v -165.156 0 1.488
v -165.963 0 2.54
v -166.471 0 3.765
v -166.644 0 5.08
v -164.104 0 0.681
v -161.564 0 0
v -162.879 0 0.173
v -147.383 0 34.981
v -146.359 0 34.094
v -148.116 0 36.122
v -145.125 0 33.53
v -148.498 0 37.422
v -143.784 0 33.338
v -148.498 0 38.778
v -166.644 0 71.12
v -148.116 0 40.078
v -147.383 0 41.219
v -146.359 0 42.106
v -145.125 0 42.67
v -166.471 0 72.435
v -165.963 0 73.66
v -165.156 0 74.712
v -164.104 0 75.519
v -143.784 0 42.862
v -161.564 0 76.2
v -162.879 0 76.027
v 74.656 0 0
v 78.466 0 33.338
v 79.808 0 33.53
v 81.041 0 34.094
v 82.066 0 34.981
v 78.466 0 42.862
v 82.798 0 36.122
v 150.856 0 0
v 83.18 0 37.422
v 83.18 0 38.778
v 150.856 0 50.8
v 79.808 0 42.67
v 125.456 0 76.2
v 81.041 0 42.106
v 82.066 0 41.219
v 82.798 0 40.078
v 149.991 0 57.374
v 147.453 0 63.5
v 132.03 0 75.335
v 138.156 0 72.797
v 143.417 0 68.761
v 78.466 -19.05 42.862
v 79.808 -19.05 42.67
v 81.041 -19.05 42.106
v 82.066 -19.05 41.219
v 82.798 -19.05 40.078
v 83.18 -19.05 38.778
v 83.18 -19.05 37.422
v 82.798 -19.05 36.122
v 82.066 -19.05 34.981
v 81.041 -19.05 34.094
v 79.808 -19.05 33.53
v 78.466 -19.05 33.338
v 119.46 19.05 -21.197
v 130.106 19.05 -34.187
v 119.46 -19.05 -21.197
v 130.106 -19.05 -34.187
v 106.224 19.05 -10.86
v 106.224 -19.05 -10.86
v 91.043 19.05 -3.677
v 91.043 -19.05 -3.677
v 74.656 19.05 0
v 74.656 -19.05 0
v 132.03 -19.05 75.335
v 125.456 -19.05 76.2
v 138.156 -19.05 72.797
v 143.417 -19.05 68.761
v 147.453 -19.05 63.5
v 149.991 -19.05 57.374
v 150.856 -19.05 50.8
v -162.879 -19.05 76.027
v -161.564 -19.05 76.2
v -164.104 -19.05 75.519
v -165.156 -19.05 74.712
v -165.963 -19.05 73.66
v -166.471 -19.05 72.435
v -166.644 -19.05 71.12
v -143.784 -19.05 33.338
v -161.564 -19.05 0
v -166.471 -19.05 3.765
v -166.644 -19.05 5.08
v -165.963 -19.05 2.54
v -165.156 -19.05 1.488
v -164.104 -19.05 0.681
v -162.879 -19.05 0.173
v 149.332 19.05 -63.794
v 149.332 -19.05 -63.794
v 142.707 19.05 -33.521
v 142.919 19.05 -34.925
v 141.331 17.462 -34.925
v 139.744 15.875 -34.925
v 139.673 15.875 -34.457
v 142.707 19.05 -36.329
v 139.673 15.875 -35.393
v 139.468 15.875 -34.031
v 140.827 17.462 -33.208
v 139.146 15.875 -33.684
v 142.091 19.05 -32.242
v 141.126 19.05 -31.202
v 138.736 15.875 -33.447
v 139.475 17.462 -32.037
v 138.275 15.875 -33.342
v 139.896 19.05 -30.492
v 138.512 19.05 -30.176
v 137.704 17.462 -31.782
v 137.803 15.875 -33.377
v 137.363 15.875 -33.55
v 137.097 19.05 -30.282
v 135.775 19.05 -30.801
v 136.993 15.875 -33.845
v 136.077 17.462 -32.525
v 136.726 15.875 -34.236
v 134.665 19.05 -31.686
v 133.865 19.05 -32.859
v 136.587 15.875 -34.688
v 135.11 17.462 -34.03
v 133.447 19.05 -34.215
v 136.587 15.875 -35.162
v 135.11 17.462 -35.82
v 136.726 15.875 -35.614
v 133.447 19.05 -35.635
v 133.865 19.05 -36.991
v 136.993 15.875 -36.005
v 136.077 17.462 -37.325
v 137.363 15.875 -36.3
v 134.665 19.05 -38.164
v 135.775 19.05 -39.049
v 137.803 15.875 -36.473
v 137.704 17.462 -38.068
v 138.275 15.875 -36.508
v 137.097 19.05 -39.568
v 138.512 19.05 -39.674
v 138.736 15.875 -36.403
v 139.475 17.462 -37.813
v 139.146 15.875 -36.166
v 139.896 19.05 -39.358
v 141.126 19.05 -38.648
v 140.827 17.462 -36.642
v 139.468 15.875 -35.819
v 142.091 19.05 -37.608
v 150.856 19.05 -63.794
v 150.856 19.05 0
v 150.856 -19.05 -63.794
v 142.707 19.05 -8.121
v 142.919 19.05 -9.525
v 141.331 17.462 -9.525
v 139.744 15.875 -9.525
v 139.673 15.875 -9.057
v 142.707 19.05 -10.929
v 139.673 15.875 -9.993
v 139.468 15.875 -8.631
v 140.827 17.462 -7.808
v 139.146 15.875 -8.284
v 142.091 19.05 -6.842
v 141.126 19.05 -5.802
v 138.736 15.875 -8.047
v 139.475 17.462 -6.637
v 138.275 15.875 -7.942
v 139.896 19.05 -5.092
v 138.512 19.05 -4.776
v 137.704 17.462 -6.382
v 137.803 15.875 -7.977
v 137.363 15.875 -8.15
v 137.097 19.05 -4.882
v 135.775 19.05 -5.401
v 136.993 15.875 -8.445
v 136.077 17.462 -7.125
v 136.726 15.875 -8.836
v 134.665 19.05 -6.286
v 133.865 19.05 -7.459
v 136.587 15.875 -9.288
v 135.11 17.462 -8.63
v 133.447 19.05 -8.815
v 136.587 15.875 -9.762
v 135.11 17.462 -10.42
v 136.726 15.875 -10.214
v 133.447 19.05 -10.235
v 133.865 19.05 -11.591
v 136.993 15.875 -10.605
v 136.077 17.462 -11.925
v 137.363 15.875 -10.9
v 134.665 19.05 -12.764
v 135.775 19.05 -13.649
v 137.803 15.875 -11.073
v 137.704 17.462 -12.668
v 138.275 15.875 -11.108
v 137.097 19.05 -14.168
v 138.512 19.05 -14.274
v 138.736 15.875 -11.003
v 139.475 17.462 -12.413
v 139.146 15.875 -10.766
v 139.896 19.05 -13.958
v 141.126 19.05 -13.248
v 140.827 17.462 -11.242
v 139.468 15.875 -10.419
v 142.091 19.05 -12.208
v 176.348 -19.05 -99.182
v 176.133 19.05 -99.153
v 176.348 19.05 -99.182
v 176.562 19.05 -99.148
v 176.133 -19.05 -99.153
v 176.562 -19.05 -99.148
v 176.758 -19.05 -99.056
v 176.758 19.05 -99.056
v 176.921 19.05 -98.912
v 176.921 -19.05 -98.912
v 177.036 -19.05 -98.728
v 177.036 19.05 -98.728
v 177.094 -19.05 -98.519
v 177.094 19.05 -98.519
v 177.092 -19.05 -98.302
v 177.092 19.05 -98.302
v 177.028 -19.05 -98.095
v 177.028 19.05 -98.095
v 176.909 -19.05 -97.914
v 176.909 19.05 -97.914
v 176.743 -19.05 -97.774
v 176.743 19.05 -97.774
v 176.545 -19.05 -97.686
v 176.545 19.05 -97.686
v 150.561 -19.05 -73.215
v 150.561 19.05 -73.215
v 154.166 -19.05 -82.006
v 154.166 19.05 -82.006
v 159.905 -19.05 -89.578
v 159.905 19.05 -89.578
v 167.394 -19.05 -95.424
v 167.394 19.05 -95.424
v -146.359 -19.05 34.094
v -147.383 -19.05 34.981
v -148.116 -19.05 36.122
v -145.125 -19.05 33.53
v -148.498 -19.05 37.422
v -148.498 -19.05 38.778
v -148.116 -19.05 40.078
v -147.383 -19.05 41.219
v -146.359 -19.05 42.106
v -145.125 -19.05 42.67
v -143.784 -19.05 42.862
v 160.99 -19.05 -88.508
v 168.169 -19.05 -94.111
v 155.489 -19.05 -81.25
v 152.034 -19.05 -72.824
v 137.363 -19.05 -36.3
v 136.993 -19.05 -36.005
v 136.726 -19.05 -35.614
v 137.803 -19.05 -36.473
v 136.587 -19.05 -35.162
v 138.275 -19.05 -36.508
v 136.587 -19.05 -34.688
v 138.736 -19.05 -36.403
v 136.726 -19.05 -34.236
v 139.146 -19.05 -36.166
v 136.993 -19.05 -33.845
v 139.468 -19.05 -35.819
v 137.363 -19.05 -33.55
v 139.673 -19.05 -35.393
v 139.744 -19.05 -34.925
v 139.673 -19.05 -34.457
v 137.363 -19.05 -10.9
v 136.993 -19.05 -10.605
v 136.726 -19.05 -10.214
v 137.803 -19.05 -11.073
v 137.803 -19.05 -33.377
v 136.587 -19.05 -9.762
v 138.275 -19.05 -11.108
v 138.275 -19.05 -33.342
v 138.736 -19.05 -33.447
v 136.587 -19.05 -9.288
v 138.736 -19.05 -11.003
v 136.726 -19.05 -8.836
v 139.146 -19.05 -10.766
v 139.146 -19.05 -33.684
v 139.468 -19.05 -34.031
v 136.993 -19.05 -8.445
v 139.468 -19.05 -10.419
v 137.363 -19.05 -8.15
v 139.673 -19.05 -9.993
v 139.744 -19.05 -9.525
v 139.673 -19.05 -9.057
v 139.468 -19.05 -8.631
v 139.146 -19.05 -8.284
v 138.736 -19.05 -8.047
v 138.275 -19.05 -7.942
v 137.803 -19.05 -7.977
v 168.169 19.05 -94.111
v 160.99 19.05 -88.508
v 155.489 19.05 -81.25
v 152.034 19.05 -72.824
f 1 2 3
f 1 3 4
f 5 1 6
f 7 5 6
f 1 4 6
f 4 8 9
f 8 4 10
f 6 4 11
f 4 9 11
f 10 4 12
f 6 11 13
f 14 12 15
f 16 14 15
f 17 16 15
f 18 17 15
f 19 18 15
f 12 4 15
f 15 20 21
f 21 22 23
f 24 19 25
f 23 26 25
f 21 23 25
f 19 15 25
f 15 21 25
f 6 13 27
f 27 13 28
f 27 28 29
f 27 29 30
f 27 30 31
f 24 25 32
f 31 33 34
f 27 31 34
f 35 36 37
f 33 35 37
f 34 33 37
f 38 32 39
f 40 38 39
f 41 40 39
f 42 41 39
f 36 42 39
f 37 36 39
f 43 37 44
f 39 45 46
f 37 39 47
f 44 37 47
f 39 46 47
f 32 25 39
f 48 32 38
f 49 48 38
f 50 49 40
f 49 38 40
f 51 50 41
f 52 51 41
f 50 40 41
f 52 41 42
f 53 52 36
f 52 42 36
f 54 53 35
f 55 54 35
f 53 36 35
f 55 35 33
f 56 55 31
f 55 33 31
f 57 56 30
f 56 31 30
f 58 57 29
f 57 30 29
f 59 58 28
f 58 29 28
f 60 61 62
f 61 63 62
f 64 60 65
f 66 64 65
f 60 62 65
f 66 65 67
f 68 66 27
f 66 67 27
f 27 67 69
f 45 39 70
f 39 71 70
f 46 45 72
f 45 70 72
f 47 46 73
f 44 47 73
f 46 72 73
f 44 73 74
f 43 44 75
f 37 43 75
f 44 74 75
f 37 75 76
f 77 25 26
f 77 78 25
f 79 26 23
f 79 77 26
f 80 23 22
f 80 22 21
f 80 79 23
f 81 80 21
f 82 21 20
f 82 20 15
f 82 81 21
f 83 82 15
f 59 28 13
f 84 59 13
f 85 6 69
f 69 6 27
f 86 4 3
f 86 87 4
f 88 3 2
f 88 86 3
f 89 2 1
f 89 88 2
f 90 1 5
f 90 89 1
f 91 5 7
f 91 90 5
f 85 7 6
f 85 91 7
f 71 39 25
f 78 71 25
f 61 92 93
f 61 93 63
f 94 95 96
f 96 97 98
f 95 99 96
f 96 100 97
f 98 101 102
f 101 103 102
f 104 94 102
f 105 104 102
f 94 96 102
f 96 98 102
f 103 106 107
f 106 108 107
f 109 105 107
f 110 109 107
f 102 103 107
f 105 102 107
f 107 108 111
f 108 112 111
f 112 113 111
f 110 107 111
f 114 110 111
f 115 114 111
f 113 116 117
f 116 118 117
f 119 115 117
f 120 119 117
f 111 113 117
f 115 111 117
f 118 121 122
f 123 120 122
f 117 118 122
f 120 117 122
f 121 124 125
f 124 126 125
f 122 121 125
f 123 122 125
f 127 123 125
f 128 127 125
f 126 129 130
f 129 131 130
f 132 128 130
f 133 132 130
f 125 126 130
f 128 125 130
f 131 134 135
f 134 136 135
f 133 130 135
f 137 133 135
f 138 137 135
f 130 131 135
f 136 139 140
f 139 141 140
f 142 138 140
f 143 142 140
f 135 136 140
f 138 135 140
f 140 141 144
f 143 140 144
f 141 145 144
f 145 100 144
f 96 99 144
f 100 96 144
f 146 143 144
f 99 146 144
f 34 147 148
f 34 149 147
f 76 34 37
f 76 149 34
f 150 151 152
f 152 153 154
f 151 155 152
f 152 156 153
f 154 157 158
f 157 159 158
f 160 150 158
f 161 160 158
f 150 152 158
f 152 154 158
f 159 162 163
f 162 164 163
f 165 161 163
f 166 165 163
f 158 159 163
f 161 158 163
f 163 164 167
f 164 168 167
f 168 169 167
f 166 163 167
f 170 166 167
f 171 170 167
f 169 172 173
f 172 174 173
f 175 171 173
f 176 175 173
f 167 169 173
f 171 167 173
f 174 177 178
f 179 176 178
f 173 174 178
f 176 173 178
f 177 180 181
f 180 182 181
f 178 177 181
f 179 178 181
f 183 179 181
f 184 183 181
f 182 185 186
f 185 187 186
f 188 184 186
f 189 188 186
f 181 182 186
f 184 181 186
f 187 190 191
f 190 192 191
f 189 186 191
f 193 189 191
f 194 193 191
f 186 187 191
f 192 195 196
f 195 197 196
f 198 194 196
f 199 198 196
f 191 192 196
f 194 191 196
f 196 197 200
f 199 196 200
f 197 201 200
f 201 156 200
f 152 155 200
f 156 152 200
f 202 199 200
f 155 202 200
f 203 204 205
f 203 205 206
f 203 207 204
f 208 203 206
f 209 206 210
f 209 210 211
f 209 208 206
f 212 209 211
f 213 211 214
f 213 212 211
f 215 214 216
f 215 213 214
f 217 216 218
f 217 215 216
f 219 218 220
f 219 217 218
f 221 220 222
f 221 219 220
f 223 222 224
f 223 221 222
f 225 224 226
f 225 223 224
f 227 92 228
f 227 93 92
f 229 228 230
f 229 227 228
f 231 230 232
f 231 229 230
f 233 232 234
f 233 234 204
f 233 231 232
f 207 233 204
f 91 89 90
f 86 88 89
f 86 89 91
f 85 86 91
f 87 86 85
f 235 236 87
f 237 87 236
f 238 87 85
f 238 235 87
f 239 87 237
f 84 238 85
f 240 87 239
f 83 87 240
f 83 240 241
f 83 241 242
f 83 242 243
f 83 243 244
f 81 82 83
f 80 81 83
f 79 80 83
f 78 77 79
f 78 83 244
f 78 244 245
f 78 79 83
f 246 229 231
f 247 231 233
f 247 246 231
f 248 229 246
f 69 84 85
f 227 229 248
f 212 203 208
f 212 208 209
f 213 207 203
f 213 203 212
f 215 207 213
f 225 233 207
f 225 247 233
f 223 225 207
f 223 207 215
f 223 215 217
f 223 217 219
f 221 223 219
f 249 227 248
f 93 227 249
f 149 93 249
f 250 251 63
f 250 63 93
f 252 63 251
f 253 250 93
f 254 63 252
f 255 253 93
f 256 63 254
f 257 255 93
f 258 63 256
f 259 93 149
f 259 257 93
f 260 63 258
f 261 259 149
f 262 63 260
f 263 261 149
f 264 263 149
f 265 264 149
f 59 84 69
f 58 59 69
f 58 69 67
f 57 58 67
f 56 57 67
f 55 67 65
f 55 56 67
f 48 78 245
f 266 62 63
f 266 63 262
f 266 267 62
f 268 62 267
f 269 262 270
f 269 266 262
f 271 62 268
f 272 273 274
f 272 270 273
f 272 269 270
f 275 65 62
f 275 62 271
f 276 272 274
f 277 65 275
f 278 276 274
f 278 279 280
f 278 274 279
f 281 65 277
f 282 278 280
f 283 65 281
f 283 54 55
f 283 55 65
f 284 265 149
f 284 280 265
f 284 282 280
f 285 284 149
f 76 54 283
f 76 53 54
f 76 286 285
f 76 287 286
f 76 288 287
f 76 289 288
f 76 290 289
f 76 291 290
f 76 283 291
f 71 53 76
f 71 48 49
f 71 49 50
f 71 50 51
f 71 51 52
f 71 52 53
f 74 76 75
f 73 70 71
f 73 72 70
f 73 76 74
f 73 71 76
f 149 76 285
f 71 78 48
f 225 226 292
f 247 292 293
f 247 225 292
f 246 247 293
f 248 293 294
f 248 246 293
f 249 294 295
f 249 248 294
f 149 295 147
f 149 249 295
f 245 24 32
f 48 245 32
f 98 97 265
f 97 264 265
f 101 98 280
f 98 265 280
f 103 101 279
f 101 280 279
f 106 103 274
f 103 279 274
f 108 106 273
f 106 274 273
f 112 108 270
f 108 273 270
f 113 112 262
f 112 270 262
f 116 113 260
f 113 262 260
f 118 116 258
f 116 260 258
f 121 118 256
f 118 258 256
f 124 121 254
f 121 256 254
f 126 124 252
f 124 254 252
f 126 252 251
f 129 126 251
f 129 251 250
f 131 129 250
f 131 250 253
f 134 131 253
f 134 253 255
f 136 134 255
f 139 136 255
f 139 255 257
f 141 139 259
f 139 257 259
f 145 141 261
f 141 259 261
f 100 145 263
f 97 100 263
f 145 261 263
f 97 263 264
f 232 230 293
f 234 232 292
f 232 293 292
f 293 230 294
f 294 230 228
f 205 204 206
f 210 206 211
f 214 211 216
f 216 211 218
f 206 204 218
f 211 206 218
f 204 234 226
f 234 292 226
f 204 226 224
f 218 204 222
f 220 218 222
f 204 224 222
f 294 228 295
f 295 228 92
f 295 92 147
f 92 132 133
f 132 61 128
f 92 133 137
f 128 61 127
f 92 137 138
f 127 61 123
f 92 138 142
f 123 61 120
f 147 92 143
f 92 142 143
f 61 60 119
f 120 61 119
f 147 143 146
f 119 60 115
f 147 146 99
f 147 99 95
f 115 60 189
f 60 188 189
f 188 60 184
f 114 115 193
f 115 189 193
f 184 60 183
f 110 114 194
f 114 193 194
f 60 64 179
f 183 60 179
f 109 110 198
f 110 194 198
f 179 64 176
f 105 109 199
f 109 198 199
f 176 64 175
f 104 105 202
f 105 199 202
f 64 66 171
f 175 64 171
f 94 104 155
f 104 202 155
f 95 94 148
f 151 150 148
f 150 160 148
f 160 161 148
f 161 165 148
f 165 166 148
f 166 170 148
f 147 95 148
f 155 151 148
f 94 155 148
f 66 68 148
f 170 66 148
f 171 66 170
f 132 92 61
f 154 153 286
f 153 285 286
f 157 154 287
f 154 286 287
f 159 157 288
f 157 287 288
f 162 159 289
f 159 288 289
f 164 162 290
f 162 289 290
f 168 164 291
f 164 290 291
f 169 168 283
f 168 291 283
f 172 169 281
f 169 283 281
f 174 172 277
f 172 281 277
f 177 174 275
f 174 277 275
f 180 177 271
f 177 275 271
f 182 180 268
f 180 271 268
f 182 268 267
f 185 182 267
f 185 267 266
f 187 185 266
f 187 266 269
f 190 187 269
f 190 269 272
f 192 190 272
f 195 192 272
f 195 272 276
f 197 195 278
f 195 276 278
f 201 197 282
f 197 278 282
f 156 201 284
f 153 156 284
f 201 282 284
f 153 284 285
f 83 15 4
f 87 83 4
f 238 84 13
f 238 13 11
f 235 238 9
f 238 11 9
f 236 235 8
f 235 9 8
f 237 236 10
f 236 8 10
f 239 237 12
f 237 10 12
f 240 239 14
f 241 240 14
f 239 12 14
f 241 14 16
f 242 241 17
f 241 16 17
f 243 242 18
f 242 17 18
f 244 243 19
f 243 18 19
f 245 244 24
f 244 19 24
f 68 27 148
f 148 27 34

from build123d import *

# Parameters (mm, degrees)
F0_R           = 1.3992842893
F1_DEPTH       = 19.05
F2_R           = 5.08
F3_R           = 25.4
F4_R           = 1.3992842893
F5_DEPTH       = 19.05
F7_D           = 3.175
F7_CSINK_D     = 9.525
F7_CSINK_ANGLE = 90
F9_DEPTH       = 38.101
F11_DEPTH      = 19.05
F11_DEPTH_BACK = 19.05


with BuildPart() as f1:
    # F0 (on Front) → F1 (new body)
    with BuildSketch(Plane.XZ):
        with BuildLine():
            Line((150.8562757823, 76.2), (-166.6437242177, 76.2))
            Line((-166.6437242177, 76.2), (-166.6437242177, 0))
            Line((-166.6437242177, 0), (74.6562757823, 0))
            ThreePointArc((74.6562757823, 0), (106.2243540544, -10.8596763882), (130.1055285482, -34.187034615))
            Line((130.1055285482, -34.187034615), (150.8562757823, -66.1403832537))
            Line((150.8562757823, -66.1403832537), (150.8562757823, 76.2))
        make_face()
        with Locations((138.1562757823, -34.925)):
            Circle(F0_R, mode=Mode.SUBTRACT)
        with Locations((138.1562757823, -9.525)):
            Circle(F0_R, mode=Mode.SUBTRACT)
        with BuildLine():
            Line((78.4662757823, 33.3375), (-143.7837242177, 33.3375))
            ThreePointArc((-143.7837242177, 33.3375), (-148.5462242177, 38.1), (-143.7837242177, 42.8625))
            Line((-143.7837242177, 42.8625), (78.4662757823, 42.8625))
            ThreePointArc((78.4662757823, 42.8625), (83.2287757823, 38.1), (78.4662757823, 33.3375))
        make_face(mode=Mode.SUBTRACT)
        with Locations((138.1562757823, -34.925)):
            Circle(F0_R)
        with Locations((138.1562757823, -9.525)):
            Circle(F0_R)
    extrude(amount=F1_DEPTH)

    # F2
    f2_edges = [f1.edges().sort_by_distance(p)[0] for p in [
        (-166.643724, -9.525, 76.2),
        (-166.643724, -9.525, 0),
    ]]
    fillet(f2_edges, radius=F2_R)

    # F3
    f3_edges = [f1.edges().sort_by_distance(p)[0] for p in [
        (150.856276, -9.525, 76.2),
    ]]
    fillet(f3_edges, radius=F3_R)

    # F4 (on face) → F5 (join)
    with BuildSketch(Plane(origin=(0, 0, 0), x_dir=(-1, 0, 0), z_dir=(0, 1, 0))):
        with BuildLine():
            Line((-150.8562757823, 0), (-150.8562757823, -66.1403832537))
            Line((-150.8562757823, -66.1403832537), (-130.1055285482, -34.187034615))
            ThreePointArc((-130.1055285482, -34.187034615), (-106.2243540544, -10.8596763882), (-74.6562757823, 0))
            Line((-74.6562757823, 0), (-150.8562757823, 0))
        make_face()
        with Locations((-138.1562757823, -34.925)):
            Circle(F4_R, mode=Mode.SUBTRACT)
        with Locations((-138.1562757823, -9.525)):
            Circle(F4_R, mode=Mode.SUBTRACT)
        with Locations((-138.1562757823, -34.925)):
            Circle(F4_R)
        with Locations((-138.1562757823, -9.525)):
            Circle(F4_R)
    extrude(amount=F5_DEPTH)

    # F7 (through all)
    with Locations(Plane(origin=(0, 19.05, 0), x_dir=(-1, 0, 0), z_dir=(0, 1, 0))):
        with Locations((-138.1562757823, -34.925), (-138.1562757823, -9.525)):
            CounterSinkHole(F7_D / 2, F7_CSINK_D / 2, counter_sink_angle=F7_CSINK_ANGLE)

    # F8 (on face) → F9 (cut, through all)
    with BuildSketch(Plane.XZ.offset(19.05)):
        Polygon((150.8562757823, -66.1403832537), (150.8562757823, -2.6403832537), (149.3322757823, -2.6403832537), (149.3322757823, -63.7936290488), align=None)
    extrude(amount=-F9_DEPTH, mode=Mode.SUBTRACT)

    # F10 (on Front) → F11 (join, two sides)
    with BuildSketch(Plane.XZ) as f11_sk:
        with BuildLine():
            Line((150.8562757823, -63.7936290488), (150.8562757823, -2.6403832537))
            Line((150.8562757823, -2.6403832537), (149.3322757823, -2.6403832537))
            Line((149.3322757823, -2.6403832537), (149.3322757823, -63.7936290488))
            ThreePointArc((149.3322757823, -63.7936290488), (156.7895472638, -85.9779592892), (176.1329621077, -99.1532281041))
            ThreePointArc((176.1329621077, -99.1532281041), (177.0725432504, -98.6255205372), (176.5448356835, -97.6859393944))
            ThreePointArc((176.5448356835, -97.6859393944), (158.004098895, -85.0573940633), (150.8562757823, -63.7936290488))
        make_face()
    extrude(amount=F11_DEPTH)
    extrude(f11_sk.sketch, amount=-F11_DEPTH_BACK)


solid = f1.part
